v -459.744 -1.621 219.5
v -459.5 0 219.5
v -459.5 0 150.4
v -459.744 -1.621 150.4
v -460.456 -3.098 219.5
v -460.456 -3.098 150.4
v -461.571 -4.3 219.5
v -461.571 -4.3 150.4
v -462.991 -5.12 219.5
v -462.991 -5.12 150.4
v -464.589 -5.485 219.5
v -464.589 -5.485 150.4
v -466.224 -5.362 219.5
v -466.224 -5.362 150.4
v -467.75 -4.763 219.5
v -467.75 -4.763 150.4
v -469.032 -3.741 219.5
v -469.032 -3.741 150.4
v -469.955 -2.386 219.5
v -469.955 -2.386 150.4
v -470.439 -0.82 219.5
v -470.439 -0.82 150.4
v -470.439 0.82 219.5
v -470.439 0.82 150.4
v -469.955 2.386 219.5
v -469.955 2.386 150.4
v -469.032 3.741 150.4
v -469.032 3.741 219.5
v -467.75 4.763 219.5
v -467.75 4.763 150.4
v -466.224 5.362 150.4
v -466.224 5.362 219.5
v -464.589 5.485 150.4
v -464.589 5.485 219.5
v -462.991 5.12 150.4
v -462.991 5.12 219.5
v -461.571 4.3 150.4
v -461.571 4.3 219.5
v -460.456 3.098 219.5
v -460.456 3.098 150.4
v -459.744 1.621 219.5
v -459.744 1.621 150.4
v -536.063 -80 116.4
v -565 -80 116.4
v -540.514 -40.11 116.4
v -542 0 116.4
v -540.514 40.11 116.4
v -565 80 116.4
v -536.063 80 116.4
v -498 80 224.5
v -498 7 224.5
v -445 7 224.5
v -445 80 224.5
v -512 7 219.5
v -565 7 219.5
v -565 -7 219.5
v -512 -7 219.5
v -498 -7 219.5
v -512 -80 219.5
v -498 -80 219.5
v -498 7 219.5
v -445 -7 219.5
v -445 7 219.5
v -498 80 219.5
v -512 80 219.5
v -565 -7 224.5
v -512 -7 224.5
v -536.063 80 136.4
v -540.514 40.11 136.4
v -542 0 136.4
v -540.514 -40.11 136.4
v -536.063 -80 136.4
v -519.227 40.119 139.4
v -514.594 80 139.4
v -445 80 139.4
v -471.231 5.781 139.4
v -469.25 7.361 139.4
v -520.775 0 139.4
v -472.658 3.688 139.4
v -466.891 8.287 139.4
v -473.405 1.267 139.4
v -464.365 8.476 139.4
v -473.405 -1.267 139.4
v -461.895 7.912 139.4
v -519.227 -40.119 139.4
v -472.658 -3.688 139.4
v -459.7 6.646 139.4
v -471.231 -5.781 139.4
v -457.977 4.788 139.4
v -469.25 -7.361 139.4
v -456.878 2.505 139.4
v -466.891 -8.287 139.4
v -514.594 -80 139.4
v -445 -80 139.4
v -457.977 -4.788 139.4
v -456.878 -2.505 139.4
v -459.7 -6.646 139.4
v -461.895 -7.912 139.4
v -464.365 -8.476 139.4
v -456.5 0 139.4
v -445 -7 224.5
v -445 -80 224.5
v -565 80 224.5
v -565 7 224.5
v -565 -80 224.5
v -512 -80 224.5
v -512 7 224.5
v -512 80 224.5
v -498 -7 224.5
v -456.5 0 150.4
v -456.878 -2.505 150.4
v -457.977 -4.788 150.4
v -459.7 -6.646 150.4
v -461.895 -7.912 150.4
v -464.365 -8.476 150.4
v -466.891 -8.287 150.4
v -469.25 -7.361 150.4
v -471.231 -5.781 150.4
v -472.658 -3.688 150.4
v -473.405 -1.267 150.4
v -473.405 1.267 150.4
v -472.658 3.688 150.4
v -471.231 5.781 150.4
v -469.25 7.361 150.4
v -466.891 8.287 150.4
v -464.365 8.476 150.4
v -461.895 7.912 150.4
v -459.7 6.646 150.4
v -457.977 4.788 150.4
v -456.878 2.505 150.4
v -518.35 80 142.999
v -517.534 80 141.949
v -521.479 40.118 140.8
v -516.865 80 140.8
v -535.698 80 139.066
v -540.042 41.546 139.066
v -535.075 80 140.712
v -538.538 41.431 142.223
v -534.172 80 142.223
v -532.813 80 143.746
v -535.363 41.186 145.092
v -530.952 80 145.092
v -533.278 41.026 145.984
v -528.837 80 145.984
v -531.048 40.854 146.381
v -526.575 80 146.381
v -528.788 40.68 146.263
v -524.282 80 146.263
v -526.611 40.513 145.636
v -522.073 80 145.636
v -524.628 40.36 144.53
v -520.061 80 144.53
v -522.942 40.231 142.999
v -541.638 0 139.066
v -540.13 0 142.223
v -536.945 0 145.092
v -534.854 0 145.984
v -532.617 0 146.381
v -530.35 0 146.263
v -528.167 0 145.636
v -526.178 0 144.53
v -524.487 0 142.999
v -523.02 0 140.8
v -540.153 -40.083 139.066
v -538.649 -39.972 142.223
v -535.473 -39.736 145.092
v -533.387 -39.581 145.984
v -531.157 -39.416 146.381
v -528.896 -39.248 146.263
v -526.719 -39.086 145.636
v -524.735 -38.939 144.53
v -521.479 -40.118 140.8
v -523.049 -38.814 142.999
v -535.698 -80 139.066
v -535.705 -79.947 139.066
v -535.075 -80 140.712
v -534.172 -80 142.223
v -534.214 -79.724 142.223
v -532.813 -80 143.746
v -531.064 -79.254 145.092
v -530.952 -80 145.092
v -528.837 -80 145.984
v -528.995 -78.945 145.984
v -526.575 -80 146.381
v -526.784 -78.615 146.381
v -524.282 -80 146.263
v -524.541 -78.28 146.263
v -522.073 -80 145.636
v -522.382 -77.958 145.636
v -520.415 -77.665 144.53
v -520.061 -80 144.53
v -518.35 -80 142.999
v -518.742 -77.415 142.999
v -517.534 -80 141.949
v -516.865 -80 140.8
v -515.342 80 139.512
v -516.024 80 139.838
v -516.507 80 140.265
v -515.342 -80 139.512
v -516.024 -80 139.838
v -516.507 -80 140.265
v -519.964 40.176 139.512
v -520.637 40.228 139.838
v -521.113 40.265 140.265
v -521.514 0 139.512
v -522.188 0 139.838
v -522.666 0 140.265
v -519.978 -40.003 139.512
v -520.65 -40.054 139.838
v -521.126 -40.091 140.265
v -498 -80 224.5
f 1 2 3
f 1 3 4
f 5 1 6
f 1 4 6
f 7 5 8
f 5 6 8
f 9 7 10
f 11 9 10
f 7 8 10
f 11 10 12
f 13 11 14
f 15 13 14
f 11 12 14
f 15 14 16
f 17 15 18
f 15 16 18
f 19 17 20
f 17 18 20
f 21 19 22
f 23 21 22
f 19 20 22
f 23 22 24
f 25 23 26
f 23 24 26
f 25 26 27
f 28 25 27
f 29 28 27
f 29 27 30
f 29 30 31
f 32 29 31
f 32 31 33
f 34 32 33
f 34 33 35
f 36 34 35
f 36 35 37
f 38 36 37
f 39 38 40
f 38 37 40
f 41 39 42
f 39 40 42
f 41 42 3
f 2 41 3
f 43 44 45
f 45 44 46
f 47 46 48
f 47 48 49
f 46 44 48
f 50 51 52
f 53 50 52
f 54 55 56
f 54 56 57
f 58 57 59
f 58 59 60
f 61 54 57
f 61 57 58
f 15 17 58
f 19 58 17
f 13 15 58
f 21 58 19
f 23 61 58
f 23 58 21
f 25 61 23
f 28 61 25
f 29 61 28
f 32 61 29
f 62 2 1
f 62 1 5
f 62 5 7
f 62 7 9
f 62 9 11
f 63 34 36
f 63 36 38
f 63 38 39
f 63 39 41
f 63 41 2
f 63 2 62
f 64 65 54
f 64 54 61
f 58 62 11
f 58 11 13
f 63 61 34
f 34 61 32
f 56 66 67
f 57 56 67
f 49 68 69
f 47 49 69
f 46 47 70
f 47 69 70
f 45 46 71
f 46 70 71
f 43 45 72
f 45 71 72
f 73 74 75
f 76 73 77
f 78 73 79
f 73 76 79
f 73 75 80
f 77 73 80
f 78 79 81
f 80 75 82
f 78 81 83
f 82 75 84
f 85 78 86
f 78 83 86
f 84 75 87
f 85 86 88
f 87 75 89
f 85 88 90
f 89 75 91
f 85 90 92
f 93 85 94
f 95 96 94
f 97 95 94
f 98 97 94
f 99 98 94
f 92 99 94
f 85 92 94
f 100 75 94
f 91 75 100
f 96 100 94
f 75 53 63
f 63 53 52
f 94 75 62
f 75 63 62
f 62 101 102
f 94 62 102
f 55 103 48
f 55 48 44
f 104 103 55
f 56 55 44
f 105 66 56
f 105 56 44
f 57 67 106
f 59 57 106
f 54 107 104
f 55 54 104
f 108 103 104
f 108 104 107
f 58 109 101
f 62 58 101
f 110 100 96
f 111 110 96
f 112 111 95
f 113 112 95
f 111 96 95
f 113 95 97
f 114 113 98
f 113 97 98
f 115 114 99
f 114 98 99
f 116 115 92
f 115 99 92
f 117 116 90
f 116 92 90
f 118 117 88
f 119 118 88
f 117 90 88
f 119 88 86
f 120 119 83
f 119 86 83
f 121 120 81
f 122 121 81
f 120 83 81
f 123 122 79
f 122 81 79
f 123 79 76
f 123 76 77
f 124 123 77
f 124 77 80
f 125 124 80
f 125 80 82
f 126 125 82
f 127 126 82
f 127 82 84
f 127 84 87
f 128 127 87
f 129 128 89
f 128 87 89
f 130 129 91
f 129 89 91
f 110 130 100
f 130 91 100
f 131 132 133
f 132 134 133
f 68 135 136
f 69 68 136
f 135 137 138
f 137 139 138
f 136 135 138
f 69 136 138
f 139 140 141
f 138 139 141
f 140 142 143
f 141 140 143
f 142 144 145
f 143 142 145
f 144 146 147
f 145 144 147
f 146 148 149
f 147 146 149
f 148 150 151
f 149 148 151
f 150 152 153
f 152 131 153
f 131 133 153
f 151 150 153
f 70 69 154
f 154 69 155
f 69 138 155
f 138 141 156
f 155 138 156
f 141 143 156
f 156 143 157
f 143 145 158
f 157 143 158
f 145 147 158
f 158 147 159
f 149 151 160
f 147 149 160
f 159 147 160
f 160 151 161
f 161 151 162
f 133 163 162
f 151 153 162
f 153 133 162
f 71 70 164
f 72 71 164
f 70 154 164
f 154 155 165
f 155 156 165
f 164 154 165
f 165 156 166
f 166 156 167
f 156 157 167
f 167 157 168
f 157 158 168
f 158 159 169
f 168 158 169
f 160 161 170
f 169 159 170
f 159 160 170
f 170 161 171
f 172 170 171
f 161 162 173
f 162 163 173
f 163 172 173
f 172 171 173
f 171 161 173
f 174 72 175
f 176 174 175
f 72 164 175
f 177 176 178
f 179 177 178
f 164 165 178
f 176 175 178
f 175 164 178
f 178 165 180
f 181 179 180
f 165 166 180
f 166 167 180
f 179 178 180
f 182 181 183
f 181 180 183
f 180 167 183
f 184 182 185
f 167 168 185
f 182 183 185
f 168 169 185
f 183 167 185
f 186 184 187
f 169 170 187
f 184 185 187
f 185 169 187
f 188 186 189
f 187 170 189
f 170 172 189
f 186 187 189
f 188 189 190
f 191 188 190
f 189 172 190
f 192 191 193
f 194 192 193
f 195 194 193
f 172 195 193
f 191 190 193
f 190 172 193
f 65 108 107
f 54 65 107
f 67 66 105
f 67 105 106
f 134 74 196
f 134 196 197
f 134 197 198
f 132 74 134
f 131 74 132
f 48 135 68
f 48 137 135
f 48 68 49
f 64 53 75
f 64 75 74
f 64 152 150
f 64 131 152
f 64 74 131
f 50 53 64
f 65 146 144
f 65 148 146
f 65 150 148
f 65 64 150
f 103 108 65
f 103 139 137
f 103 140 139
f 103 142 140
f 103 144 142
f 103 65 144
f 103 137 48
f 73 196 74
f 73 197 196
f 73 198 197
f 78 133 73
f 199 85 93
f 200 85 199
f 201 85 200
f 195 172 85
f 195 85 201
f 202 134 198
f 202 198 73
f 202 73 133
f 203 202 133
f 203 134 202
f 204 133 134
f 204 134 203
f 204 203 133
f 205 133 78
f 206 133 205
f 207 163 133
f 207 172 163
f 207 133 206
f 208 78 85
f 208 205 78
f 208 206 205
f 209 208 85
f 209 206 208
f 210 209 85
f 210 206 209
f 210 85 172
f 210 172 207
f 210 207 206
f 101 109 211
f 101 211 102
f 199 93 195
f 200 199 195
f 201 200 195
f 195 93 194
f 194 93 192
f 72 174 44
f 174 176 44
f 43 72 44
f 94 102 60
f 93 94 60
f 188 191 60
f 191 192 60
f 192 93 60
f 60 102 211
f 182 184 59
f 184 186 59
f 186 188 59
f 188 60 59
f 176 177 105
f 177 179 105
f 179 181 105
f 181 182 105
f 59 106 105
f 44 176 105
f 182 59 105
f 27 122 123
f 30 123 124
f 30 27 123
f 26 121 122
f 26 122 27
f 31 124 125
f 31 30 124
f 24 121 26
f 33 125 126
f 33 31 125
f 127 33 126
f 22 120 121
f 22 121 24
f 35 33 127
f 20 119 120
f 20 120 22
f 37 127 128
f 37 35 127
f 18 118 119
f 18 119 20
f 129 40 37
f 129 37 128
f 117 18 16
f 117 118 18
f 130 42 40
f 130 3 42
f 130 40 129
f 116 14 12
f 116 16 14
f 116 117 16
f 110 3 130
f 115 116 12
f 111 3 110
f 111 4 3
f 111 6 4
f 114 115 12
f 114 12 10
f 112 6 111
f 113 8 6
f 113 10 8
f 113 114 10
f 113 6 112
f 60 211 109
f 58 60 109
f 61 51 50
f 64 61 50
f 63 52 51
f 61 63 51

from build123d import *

# Parameters (mm, degrees)
F5_DEPTH  = 108.1010001
F7_DEPTH  = 108.1
F9_DEPTH  = 5
F10_R     = 8.5
F11_DEPTH = 11
F12_R     = 5.5
F13_DEPTH = 69.1


with BuildPart() as f3:
    # F3: sweep along a path in F2
    with BuildLine(Plane.XY.offset(139.4)) as f3_path:
        ThreePointArc((-340.8897771879, 286.0404863105), (-445, 0), (-340.8897771879, -286.0404863105))
    # F0 (on Front) → F3 (sweep)
    with BuildSketch(Plane.XZ):
        with BuildLine():
            Line((-565, 116.4), (-542, 116.4))
            Line((-542, 116.4), (-542, 136.4))
            ThreePointArc((-542, 136.4), (-534.2583426132, 146.1416573868), (-523.0200222717, 140.8))
            ThreePointArc((-523.0200222717, 140.8), (-522.0979034952, 139.7786796564), (-520.7750278397, 139.4))
            Line((-520.7750278397, 139.4), (-445, 139.4))
            Line((-445, 139.4), (-445, 224.5))
            Line((-445, 224.5), (-565, 224.5))
            Line((-565, 224.5), (-565, 116.4))
        make_face()
    sweep(path=f3_path.line)

    # F4 (on face) → F5 (cut, through all)
    with BuildSketch(Plane.XY.offset(224.5)):
        with BuildLine():
            ThreePointArc((-432.8151103622, 363.1749994729), (-515.8719724812, 230.4367765969), (-559.3076076722, 80))
            Line((-559.3076076722, 80), (-445, 80))
            Line((-445, 80), (-445, 0))
            ThreePointArc((-445, 0), (-418.1632162497, 152.1989637799), (-340.8897771879, 286.0404863105))
            Line((-340.8897771879, 286.0404863105), (-432.8151103622, 363.1749994729))
        make_face()
        with BuildLine():
            Line((-445, -80), (-559.3076076722, -80))
            ThreePointArc((-559.3076076722, -80), (-515.8719724812, -230.4367765969), (-432.8151103622, -363.1749994729))
            Line((-432.8151103622, -363.1749994729), (-340.8897771879, -286.0404863105))
            ThreePointArc((-340.8897771879, -286.0404863105), (-418.1632162497, -152.1989637799), (-445, 0))
            Line((-445, 0), (-445, -80))
        make_face()
    extrude(amount=-F5_DEPTH, mode=Mode.SUBTRACT)

    # F6 (on face) → F7 (join, through all)
    with BuildSketch(Plane.XY.offset(224.5)):
        with BuildLine():
            ThreePointArc((-565, 0), (-563.57510517, 40.1011325601), (-559.3076076722, 80))
            Line((-559.3076076722, 80), (-565, 80))
            Line((-565, 80), (-565, 0))
        make_face()
        with BuildLine():
            ThreePointArc((-559.3076076722, -80), (-563.57510517, -40.1011325601), (-565, 0))
            Line((-565, 0), (-565, -80))
            Line((-565, -80), (-559.3076076722, -80))
        make_face()
    extrude(amount=-F7_DEPTH)

    # F8 (on face) → F9 (cut)
    with BuildSketch(Plane.XY.offset(224.5)):
        Polygon((-498, 80), (-512, 80), (-512, 7), (-565, 7), (-565, -7), (-512, -7), (-512, -80), (-498, -80), (-498, -7), (-445, -7), (-445, 7), (-498, 7), align=None)
    extrude(amount=-F9_DEPTH, mode=Mode.SUBTRACT)

    # F10 (on face) → F11 (cut)
    with BuildSketch(Plane(origin=(0, 0, 139.4), x_dir=(1, 0, 0), z_dir=(0, 0, -1))):
        with Locations((-465, 0)):
            Circle(F10_R)
    extrude(amount=-F11_DEPTH, mode=Mode.SUBTRACT)

    # F12 (on face) → F13 (cut, through all)
    with BuildSketch(Plane(origin=(0, 0, 150.4), x_dir=(1, 0, 0), z_dir=(0, 0, -1))):
        with Locations((-465, 0)):
            Circle(F12_R)
    extrude(amount=-F13_DEPTH, mode=Mode.SUBTRACT)


solid = f3.part
